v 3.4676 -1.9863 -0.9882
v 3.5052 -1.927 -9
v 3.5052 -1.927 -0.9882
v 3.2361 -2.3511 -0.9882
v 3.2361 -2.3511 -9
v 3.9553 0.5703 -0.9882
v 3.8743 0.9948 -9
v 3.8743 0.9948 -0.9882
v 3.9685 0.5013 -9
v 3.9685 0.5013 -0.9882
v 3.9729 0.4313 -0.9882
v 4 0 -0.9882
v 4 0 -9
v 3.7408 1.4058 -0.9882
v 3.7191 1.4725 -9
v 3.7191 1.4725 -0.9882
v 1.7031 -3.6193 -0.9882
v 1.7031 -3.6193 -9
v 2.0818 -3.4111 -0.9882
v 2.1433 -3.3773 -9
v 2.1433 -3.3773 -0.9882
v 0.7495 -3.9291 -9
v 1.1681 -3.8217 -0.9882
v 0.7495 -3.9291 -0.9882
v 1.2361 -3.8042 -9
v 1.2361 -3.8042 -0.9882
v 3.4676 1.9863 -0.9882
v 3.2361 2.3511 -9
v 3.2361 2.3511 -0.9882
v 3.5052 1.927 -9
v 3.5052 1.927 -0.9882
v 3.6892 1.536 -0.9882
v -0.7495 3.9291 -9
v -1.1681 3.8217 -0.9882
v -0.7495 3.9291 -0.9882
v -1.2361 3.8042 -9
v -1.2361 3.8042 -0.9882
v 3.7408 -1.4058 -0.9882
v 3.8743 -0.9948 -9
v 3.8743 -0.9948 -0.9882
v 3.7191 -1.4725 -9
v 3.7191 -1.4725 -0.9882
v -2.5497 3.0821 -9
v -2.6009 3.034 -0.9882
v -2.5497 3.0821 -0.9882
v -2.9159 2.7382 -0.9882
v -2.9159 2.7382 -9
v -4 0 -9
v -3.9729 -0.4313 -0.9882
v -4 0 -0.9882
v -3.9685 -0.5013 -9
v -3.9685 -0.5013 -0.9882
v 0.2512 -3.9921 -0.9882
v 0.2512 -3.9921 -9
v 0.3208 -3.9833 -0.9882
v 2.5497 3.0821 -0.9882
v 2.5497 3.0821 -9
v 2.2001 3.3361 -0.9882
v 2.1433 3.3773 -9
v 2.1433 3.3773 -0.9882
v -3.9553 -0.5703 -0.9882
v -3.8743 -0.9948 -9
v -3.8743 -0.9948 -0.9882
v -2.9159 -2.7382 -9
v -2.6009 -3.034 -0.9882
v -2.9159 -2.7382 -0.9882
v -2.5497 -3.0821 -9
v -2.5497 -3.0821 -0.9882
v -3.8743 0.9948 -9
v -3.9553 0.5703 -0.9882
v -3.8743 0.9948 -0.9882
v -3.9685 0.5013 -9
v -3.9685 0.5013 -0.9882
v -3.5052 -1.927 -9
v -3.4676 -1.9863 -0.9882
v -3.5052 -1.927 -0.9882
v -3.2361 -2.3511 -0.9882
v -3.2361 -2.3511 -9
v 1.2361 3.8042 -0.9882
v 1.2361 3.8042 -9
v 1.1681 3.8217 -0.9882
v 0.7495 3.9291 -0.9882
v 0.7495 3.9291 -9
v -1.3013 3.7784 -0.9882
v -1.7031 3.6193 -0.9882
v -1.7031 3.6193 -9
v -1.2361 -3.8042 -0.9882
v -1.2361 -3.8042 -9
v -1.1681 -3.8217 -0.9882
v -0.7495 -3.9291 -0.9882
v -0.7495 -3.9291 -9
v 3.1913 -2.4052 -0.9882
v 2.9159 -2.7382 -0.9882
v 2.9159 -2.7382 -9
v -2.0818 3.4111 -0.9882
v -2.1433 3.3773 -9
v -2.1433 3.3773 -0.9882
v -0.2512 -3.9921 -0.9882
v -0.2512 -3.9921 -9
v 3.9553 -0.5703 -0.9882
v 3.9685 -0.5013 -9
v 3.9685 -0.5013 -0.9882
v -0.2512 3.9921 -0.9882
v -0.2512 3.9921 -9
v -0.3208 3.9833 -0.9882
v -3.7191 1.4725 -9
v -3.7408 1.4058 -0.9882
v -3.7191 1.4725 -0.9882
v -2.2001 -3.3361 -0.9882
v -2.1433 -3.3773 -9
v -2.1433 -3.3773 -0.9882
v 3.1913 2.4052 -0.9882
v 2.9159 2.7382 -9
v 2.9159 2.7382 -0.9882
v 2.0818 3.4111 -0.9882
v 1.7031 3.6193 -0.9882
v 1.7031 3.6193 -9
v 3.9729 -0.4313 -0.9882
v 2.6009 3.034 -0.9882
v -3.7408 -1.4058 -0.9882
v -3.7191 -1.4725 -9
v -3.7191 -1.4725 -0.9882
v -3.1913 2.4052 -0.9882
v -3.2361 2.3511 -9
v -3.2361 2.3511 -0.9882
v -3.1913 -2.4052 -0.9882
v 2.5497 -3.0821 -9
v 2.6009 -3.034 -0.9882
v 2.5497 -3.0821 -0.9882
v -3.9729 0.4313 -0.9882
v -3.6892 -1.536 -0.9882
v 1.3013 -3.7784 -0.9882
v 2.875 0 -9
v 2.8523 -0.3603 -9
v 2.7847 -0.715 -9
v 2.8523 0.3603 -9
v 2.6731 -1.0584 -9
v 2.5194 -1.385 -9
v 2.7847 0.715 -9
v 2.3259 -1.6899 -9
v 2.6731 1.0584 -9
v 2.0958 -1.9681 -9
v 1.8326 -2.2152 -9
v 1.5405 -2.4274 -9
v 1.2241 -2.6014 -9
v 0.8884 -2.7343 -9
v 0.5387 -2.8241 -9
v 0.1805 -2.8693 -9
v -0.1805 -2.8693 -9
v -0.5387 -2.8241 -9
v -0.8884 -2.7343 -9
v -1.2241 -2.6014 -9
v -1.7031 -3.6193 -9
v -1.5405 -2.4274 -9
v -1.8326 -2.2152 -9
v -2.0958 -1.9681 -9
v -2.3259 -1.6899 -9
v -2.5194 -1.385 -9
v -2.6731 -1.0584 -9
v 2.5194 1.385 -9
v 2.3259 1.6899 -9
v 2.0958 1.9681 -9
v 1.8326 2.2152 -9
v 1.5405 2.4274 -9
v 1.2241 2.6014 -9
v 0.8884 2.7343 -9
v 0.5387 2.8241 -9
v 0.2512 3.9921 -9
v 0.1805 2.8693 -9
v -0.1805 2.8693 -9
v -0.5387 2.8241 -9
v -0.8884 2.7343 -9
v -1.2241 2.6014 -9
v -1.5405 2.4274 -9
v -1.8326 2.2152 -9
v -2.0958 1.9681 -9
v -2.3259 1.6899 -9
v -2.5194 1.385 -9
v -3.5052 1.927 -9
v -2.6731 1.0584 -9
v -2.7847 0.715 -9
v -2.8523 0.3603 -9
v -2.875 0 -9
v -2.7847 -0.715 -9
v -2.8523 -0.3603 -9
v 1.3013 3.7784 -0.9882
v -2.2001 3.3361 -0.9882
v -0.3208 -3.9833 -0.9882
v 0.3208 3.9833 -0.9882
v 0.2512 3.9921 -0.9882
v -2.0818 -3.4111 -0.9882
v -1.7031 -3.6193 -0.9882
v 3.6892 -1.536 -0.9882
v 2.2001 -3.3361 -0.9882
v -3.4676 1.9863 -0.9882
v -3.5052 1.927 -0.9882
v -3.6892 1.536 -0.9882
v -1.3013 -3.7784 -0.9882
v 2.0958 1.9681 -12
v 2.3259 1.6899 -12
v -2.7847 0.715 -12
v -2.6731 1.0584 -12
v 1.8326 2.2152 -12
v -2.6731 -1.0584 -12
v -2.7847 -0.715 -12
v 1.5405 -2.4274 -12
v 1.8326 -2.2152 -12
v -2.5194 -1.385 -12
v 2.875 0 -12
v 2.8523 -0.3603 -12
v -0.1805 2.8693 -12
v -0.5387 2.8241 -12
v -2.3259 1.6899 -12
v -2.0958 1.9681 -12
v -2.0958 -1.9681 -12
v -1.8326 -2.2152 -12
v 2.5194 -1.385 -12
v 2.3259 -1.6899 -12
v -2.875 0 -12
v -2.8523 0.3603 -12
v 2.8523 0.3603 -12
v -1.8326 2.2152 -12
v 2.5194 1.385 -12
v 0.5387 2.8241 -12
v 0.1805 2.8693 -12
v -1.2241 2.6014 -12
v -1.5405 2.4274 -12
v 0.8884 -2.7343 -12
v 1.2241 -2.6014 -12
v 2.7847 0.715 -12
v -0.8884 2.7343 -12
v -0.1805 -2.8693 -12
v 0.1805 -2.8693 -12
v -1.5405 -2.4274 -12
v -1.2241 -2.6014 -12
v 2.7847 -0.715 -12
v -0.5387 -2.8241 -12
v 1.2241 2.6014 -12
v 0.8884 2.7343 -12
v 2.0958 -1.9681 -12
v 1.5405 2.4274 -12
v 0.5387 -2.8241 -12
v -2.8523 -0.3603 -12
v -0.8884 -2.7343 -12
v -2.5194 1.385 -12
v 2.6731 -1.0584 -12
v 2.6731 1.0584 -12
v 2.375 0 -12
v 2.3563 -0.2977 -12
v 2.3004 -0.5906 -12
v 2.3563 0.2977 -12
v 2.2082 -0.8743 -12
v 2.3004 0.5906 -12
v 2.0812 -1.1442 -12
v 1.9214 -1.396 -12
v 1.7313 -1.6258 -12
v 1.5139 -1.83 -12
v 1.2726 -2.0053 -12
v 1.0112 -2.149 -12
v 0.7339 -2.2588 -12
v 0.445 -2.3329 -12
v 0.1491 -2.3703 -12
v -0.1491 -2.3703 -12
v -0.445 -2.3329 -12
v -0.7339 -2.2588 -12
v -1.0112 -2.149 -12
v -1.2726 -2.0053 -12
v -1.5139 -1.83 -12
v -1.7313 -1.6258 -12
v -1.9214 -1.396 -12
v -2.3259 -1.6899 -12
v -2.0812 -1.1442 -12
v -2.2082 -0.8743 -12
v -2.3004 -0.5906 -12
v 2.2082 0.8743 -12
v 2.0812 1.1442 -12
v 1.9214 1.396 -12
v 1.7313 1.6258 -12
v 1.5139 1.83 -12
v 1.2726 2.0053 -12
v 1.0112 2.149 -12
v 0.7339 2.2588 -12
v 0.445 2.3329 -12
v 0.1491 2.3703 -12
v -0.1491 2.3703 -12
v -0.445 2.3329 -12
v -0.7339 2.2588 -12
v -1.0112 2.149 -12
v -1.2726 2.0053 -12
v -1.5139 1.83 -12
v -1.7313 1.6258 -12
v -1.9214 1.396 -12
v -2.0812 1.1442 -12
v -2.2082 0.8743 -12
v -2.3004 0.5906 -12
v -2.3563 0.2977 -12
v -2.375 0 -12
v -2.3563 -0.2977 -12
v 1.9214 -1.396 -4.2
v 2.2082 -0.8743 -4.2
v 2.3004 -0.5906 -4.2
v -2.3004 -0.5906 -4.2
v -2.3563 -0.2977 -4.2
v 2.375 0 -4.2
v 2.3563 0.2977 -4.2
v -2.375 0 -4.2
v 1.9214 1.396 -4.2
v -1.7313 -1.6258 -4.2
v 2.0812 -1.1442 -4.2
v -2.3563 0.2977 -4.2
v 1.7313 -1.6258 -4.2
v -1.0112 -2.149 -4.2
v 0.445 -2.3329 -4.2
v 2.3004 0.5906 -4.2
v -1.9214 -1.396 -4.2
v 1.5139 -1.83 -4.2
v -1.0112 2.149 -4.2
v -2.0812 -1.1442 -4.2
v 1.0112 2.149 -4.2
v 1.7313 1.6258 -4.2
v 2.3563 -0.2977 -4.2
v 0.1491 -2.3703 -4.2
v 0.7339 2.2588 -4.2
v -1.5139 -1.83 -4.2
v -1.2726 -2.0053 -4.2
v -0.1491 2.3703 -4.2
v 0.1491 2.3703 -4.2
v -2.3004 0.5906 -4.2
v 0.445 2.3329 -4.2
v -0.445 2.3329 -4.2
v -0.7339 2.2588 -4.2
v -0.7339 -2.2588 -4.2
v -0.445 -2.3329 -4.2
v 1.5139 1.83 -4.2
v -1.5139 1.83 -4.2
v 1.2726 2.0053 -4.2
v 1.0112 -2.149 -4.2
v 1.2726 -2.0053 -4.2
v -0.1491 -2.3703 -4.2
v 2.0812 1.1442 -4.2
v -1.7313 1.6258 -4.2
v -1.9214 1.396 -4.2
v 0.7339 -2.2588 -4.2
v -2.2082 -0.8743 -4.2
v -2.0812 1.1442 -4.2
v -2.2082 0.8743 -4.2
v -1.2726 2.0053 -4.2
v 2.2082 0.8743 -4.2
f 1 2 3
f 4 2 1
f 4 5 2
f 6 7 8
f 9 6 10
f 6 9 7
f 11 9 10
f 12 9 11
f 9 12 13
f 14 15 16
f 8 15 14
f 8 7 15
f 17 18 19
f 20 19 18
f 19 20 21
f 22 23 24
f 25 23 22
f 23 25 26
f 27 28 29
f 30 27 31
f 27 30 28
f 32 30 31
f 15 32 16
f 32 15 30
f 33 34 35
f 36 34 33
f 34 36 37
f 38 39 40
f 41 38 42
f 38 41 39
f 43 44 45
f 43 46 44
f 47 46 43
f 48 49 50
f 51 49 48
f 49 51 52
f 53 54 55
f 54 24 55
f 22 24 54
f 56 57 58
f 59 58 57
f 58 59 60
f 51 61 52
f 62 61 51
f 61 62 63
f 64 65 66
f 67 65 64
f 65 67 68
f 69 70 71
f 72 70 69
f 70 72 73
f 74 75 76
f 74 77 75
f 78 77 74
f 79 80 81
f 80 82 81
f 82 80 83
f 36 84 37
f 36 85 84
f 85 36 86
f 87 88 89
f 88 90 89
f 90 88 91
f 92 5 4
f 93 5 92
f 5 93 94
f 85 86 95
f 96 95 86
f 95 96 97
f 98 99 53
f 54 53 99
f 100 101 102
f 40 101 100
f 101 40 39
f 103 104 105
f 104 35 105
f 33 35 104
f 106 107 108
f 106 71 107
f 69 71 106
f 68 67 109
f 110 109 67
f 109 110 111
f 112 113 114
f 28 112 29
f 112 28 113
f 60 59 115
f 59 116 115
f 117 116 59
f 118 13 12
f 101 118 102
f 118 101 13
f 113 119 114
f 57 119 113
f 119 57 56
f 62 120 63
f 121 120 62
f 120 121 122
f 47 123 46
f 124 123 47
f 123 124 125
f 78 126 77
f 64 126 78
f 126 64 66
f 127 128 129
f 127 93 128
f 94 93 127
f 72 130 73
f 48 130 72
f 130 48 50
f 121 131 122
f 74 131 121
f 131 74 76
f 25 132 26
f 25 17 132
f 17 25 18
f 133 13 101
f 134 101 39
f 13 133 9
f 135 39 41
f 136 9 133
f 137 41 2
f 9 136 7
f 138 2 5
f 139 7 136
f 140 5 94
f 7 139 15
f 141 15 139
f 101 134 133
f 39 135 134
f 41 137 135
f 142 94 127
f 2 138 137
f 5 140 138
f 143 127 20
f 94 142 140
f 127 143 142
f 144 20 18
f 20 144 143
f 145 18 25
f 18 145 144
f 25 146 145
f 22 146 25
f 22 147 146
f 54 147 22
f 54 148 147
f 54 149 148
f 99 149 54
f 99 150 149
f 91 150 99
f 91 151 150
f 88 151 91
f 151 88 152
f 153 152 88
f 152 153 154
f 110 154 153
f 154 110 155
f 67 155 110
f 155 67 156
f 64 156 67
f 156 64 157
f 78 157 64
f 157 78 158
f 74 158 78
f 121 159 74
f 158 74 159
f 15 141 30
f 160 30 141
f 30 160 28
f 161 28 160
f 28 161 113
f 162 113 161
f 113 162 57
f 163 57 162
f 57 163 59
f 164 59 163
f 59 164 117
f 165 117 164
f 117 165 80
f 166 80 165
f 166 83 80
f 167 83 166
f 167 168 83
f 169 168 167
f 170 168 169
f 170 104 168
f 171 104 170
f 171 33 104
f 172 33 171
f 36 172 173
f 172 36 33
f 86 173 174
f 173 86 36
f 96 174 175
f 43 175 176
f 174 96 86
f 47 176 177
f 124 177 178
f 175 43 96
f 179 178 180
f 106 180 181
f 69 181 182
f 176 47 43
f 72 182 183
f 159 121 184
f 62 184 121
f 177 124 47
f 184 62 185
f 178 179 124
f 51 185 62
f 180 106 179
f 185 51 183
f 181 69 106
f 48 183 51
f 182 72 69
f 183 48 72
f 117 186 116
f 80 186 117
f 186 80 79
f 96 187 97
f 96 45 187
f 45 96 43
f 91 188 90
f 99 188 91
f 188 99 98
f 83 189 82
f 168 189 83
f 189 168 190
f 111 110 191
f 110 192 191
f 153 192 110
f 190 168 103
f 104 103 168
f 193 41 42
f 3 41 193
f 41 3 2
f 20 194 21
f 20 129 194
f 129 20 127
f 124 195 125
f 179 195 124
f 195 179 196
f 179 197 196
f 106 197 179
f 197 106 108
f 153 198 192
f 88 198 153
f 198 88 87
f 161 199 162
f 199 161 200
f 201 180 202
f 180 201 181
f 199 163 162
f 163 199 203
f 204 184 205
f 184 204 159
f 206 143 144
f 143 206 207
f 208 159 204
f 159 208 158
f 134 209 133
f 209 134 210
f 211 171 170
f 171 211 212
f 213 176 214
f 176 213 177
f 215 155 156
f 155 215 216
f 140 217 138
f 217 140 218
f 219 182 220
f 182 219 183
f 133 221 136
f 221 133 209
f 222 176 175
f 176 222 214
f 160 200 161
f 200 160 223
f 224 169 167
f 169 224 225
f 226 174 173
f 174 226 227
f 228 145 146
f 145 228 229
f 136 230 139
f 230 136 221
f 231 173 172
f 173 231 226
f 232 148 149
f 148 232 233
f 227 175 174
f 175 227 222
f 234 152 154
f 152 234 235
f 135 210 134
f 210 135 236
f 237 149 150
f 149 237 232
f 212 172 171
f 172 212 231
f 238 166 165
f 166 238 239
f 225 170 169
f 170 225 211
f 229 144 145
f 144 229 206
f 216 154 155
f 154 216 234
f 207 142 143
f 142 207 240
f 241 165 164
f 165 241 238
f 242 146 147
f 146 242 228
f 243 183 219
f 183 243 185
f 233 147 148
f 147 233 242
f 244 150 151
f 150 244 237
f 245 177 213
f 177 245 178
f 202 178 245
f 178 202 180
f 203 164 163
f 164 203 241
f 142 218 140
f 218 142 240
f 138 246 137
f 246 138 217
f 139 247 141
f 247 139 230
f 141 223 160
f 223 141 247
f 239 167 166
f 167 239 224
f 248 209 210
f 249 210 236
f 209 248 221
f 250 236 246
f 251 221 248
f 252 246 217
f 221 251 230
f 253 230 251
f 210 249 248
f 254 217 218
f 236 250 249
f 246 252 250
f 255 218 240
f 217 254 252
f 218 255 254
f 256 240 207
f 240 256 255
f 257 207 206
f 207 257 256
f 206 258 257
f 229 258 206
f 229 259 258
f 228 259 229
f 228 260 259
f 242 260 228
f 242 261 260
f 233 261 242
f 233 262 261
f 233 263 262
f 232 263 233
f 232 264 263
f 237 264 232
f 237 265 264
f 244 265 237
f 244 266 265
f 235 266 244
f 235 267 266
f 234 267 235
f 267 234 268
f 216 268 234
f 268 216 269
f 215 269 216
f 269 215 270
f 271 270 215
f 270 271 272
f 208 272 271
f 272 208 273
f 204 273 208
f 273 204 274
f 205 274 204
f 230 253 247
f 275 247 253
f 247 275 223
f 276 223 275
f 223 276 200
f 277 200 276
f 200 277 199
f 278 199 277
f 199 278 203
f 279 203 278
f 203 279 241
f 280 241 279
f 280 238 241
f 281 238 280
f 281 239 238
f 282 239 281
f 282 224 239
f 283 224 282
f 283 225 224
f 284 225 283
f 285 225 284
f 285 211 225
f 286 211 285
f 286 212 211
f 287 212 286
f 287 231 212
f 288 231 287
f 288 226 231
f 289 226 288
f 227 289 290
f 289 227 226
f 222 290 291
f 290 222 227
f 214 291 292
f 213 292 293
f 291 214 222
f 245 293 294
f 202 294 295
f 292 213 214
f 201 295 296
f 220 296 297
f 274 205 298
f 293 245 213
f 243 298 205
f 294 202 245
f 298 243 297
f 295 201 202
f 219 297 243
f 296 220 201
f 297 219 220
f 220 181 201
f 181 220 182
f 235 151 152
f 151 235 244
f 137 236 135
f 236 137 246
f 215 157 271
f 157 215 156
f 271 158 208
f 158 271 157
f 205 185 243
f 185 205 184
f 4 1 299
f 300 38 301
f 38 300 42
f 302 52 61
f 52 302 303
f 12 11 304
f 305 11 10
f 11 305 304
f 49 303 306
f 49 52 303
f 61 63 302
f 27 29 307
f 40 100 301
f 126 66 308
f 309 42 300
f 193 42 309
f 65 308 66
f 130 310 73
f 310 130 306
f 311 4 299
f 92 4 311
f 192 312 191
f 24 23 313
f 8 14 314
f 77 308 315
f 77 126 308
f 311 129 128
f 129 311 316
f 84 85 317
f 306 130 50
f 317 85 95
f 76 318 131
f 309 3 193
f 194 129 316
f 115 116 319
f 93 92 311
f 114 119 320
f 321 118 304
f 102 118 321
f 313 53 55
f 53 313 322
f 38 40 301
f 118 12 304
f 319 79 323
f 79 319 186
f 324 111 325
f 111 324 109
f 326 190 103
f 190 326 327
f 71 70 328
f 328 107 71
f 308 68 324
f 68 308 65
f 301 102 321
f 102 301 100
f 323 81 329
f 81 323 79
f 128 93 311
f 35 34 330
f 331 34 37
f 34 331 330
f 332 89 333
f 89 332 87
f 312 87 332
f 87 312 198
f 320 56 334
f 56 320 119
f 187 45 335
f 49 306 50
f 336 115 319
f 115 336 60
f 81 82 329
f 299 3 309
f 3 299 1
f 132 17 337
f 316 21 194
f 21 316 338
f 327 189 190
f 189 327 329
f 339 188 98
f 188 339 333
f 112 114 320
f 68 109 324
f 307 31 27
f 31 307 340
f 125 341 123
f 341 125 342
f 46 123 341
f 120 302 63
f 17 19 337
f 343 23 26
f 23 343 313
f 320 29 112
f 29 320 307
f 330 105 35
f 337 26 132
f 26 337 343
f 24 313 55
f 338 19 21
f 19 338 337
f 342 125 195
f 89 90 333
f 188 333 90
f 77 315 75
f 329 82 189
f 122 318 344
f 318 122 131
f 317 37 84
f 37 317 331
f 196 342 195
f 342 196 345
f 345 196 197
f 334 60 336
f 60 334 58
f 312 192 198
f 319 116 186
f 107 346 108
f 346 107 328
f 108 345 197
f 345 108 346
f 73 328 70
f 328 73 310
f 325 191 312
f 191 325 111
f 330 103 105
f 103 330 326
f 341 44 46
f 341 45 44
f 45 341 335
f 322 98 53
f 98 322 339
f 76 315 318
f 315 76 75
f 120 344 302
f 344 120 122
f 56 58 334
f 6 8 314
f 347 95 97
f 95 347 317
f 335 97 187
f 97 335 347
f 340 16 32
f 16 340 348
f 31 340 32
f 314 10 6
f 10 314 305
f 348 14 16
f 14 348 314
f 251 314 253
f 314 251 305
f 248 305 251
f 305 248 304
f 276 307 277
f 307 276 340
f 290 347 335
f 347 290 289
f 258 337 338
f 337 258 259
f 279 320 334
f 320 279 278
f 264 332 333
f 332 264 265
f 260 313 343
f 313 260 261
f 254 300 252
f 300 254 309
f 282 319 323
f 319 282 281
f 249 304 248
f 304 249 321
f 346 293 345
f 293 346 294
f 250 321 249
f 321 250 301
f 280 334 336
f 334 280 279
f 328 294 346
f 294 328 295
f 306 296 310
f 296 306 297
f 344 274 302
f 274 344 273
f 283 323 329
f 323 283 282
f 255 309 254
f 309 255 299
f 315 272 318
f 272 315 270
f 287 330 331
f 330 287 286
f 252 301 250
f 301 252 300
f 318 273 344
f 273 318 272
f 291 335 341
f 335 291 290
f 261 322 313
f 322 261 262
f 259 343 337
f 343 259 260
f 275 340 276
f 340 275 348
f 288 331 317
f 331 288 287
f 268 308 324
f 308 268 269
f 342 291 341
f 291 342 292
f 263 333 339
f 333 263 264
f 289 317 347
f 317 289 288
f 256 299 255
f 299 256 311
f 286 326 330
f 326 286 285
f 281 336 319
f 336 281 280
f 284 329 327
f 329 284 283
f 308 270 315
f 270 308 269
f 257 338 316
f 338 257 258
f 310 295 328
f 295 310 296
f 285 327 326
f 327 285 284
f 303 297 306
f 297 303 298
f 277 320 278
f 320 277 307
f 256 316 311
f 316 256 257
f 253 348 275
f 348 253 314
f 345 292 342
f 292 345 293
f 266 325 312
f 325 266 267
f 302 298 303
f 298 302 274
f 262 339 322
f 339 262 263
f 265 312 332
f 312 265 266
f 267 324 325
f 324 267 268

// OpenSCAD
$fn = 50;

difference() {
	union() {
		translate(v = [0, 0, -9.0]) {
			cylinder(h = 9, r = 4.0);
		}
		#translate(v = [0, 0, -12.0]) {
			cylinder(h = 12, r = 2.875);
		}
	}
	union() {
		translate(v = [0, 0, 0]) {
			rotate(a = [0, 0, 0]) {
				difference() {
					union() {
						translate(v = [0, 0, -12.0]) {
							cylinder(h = 12, r = 2.25);
						}
						translate(v = [0, 0, -4.2]) {
							cylinder(h = 4.2, r1 = 2.375, r2 = 4.5);
						}
						translate(v = [0, 0, -12.0]) {
							cylinder(h = 12, r = 2.375);
						}
						translate(v = [0, 0, -12.0]) {
							cylinder(h = 12, r = 2.25);
						}
					}
					union();
				}
			}
		}
	}
}
